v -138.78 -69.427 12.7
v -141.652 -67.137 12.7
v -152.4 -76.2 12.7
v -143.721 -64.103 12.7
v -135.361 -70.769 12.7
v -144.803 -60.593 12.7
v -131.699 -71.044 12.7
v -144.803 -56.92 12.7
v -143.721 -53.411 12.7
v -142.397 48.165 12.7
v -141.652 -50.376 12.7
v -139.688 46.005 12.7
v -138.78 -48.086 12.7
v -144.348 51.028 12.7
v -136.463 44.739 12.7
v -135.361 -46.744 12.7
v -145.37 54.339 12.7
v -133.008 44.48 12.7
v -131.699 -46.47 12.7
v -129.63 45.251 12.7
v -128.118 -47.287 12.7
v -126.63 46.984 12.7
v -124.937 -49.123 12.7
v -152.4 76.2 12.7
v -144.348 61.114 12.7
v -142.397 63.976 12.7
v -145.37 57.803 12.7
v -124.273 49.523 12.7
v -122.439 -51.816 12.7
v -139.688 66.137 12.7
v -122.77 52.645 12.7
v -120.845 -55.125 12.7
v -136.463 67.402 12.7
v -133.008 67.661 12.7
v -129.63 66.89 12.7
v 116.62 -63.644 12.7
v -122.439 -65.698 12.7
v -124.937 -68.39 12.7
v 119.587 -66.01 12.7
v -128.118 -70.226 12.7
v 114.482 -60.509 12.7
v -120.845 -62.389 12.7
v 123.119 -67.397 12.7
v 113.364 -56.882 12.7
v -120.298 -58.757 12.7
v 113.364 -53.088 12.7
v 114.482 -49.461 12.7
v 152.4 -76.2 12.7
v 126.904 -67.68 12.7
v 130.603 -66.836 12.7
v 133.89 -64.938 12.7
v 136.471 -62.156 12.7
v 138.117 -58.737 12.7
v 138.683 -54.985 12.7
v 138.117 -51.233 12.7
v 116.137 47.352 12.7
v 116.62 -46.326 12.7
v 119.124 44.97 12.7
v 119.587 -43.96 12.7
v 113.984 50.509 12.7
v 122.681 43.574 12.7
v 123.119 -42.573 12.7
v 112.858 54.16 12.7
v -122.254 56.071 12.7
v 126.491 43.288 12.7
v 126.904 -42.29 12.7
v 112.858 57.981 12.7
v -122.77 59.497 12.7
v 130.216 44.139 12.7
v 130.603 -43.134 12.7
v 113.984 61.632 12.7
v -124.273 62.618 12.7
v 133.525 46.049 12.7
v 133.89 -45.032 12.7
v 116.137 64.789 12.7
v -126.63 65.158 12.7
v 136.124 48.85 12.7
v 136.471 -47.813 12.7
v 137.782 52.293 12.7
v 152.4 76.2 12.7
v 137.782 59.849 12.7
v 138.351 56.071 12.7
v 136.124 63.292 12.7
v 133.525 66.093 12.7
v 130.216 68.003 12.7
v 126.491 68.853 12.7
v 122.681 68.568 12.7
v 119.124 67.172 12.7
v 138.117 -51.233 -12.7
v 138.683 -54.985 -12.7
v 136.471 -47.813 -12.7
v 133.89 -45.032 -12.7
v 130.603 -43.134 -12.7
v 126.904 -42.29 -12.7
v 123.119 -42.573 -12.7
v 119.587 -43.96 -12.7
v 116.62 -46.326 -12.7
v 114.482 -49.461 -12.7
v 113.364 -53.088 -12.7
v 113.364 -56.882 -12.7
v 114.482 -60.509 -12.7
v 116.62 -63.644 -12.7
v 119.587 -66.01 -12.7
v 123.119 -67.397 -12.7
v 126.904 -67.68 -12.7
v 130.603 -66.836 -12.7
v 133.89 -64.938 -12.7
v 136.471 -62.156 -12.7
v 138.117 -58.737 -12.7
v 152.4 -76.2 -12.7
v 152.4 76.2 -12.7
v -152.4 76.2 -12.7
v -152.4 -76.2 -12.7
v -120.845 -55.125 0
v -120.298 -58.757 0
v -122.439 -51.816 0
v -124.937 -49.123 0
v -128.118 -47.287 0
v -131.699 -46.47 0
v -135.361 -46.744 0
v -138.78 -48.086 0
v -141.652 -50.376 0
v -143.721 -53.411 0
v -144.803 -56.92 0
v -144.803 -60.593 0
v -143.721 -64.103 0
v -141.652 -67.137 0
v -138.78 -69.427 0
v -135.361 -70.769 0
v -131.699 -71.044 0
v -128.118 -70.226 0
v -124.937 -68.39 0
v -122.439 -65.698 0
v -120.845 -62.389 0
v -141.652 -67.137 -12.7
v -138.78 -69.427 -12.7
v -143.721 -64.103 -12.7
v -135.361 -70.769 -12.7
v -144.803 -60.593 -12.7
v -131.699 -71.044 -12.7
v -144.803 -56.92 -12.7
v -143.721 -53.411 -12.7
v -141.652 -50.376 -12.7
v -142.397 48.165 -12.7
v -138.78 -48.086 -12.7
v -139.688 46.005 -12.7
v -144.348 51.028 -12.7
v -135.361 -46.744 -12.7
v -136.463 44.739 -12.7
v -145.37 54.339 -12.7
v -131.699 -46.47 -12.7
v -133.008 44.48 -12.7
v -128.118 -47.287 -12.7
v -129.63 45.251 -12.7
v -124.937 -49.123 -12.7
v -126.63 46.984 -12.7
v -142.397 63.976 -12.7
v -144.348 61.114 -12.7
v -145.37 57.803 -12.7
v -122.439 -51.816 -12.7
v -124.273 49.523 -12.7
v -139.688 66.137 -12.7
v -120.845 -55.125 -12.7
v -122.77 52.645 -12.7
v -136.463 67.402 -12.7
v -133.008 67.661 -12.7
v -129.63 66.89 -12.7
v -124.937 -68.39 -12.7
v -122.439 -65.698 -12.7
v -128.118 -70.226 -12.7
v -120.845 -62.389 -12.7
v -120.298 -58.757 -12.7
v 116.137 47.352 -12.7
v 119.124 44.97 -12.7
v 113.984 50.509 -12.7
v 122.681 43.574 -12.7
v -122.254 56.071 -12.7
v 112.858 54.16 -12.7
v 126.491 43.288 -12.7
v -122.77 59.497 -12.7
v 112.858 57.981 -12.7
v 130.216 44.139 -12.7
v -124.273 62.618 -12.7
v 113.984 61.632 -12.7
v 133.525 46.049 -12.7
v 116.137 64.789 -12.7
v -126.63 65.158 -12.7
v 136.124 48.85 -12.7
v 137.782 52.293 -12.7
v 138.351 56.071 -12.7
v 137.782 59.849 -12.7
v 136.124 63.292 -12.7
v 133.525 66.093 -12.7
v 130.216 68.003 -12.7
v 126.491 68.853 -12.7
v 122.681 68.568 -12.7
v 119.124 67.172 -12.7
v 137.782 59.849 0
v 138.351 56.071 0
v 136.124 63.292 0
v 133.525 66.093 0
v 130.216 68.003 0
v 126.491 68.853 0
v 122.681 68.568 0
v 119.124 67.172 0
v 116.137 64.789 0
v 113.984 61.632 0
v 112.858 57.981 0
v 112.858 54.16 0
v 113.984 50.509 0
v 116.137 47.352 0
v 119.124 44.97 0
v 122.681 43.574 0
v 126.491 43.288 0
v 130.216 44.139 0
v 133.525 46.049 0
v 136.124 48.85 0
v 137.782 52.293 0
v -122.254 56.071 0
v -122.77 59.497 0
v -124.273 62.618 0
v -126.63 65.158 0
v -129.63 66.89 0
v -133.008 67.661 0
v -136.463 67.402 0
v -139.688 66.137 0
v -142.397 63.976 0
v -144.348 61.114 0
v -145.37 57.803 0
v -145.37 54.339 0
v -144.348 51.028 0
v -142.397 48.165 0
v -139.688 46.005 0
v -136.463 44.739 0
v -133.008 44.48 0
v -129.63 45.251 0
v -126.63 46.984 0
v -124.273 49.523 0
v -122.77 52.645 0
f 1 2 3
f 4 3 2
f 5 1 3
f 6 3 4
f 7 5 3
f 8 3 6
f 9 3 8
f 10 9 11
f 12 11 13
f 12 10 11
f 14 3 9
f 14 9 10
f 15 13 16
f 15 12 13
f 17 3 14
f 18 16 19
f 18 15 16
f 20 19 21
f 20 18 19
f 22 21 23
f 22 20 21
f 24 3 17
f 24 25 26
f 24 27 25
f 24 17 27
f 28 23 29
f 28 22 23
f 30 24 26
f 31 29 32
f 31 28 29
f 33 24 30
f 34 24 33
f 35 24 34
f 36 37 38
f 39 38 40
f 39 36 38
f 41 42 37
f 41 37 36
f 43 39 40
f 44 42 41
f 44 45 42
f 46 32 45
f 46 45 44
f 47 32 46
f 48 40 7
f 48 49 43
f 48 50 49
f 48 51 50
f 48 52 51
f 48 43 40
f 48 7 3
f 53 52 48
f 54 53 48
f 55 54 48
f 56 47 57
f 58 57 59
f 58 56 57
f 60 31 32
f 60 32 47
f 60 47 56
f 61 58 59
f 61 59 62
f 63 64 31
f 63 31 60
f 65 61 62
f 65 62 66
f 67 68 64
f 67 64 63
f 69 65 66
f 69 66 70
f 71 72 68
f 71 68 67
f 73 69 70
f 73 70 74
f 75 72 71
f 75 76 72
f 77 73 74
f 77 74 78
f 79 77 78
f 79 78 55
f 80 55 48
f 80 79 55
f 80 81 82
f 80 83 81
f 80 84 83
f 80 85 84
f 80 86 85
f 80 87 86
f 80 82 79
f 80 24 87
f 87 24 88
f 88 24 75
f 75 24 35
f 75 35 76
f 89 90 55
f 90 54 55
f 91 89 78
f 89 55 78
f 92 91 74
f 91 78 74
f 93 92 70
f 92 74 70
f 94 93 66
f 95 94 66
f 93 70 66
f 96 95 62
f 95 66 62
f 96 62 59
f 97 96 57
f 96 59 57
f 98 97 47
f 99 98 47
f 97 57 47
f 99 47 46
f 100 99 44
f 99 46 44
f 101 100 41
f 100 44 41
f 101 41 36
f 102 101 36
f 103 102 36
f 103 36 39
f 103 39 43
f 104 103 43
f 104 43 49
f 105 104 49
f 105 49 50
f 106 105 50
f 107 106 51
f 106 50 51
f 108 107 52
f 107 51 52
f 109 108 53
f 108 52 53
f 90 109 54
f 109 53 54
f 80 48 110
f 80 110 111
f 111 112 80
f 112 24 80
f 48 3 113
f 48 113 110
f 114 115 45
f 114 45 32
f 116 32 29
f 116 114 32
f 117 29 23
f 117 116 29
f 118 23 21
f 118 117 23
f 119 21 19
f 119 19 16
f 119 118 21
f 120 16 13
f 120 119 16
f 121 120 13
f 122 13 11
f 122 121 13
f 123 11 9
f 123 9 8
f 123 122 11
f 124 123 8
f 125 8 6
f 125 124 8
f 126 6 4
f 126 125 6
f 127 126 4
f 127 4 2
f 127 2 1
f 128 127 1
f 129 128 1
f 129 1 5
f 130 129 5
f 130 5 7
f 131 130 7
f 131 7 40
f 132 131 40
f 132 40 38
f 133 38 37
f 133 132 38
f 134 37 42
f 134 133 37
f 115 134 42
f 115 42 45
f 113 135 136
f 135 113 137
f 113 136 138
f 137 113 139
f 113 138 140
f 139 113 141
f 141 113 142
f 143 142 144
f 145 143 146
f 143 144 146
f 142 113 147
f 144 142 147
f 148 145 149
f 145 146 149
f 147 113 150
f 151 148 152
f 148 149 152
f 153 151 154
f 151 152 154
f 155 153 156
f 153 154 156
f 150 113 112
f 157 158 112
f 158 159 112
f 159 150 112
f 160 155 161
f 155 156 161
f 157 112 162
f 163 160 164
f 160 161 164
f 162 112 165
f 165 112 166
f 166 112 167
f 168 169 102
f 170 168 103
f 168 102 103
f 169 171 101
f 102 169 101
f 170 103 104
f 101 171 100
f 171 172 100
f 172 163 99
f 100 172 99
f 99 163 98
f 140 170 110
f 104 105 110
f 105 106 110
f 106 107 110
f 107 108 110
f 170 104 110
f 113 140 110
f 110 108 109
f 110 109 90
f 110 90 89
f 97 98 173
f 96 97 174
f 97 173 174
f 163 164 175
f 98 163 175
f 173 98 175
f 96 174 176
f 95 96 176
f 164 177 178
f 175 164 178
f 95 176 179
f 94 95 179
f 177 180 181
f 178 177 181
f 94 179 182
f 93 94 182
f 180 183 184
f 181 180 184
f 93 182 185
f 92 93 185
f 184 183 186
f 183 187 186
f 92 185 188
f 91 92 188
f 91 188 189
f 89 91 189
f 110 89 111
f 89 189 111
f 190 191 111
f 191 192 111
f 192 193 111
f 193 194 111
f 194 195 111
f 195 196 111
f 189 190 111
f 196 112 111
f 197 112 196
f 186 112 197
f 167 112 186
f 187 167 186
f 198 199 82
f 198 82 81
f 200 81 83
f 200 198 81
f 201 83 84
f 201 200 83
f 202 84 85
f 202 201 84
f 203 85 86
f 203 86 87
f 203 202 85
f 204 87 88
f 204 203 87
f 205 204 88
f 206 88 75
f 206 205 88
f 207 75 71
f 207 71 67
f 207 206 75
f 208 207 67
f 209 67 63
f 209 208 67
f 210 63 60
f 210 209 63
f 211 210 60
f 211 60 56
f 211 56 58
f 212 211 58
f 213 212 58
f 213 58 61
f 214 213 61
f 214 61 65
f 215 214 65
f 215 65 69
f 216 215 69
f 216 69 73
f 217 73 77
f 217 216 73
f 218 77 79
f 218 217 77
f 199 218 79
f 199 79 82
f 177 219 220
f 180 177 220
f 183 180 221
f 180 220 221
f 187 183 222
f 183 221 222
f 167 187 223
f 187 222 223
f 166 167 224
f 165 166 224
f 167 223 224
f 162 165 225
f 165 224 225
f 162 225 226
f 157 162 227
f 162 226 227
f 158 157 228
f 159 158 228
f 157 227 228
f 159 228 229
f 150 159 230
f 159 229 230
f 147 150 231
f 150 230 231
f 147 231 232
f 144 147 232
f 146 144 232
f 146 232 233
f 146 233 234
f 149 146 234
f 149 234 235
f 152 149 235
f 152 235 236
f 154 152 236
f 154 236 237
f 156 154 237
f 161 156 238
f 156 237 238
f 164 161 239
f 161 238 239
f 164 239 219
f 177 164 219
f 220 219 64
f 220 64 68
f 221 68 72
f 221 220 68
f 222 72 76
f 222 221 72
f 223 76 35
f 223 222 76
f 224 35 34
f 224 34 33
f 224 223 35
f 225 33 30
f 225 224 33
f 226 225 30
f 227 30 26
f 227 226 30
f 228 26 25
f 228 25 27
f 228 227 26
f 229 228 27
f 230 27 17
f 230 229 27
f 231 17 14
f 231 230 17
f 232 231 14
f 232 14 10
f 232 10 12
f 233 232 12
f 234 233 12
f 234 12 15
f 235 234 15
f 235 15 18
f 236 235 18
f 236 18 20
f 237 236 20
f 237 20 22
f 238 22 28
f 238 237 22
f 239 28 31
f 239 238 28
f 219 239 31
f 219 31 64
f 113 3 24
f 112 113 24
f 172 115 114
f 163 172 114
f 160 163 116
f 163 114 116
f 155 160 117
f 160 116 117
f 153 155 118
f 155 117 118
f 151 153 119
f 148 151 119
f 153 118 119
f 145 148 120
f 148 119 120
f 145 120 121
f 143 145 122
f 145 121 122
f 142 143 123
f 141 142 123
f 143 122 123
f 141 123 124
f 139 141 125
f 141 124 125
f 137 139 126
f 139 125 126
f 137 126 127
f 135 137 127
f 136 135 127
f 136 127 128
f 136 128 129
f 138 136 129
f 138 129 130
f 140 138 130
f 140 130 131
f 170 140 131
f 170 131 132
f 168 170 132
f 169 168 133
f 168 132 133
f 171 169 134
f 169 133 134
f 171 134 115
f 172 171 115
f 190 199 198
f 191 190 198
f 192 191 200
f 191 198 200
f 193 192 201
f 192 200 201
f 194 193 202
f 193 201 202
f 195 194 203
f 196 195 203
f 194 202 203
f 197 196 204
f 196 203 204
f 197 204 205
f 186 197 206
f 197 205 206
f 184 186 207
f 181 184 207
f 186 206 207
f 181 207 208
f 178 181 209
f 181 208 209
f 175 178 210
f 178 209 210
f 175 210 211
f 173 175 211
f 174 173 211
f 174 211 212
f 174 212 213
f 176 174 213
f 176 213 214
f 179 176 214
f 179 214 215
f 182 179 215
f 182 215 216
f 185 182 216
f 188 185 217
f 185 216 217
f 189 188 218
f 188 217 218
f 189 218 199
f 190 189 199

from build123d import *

# Parameters (mm, degrees)
F0_W     = 304.8
F0_H     = 152.4
F1_DEPTH = 12.7
F2_R     = 11.622867
F2_R_2   = 12.321487
F2_R_3   = 12.818207
F2_R_4   = 12.730774
F3_DEPTH = 12.7


with BuildPart() as f1:
    # F0 (on Top) → F1 (new body, symmetric)
    with BuildSketch(Plane.XY):
        Rectangle(F0_W, F0_H)
    extrude(amount=F1_DEPTH, both=True)

    # F2 (on Top) → F3 (cut, symmetric)
    with BuildSketch(Plane.XY):
        with Locations((-133.876547, 56.070849)):
            Circle(F2_R)
        with Locations((-132.619306, -58.75669)):
            Circle(F2_R_2)
        with Locations((125.533119, 56.070849)):
            Circle(F2_R_3)
        with Locations((125.952214, -54.984987)):
            Circle(F2_R_4)
    extrude(amount=F3_DEPTH, both=True, mode=Mode.SUBTRACT)


solid = f1.part
